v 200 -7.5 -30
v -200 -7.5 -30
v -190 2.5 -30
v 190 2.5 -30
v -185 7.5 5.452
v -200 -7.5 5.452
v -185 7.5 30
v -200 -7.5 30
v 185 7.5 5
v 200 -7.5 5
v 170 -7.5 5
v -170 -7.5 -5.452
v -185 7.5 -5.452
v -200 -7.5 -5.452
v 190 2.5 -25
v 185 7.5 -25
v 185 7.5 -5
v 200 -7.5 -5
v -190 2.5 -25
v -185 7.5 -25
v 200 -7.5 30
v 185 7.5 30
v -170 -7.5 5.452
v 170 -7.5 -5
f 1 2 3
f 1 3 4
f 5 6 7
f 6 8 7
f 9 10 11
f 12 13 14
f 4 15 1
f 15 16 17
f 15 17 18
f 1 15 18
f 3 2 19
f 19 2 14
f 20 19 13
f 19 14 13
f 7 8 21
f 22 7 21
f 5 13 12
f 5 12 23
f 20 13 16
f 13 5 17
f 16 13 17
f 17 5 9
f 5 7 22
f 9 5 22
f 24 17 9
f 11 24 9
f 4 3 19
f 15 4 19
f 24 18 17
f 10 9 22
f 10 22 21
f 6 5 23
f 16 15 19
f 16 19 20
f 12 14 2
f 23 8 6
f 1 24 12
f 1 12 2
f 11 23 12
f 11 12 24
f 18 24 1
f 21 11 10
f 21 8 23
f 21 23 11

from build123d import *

# Parameters (mm, degrees)
F0_W     = 400
F0_H     = 60
F1_DEPTH = 7.5
F3_DEPTH = 60
F4_W     = 21.213203
F4_H     = 10
F5_DEPTH = 25
F6_W     = 21.213203
F6_H     = 10.904174
F7_DEPTH = 25
F8_W     = 5
F8_H     = 5
F9_DEPTH = 200


with BuildPart() as f1:
    # F0 (on Front) → F1 (new body, symmetric)
    with BuildSketch(Plane.XZ):
        Rectangle(F0_W, F0_H)
    extrude(amount=F1_DEPTH, both=True)

    # F2 (on face) → F3 (cut)
    with BuildSketch(Plane.XY.offset(30)):
        Polygon((-200, 7.5), (-200, -7.5), (-185, 7.5), align=None)
        Polygon((185, 7.5), (200, -7.5), (200, 7.5), align=None)
    extrude(amount=-F3_DEPTH, mode=Mode.SUBTRACT)

    # F4 (on face) → F5 (cut)
    with BuildSketch(Plane(origin=(96.25, 96.25, 0), x_dir=(-0.707107, 0.707107, 0), z_dir=(0.707107, 0.707107, 0))):
        with Locations((-136.118055, 0)):
            Rectangle(F4_W, F4_H)
    extrude(amount=-F5_DEPTH, mode=Mode.SUBTRACT)

    # F6 (on face) → F7 (cut)
    with BuildSketch(Plane(origin=(-96.25, 96.25, 0), x_dir=(-0.707107, -0.707107, 0), z_dir=(-0.707107, 0.707107, 0))):
        with Locations((136.118055, 0)):
            Rectangle(F6_W, F6_H)
    extrude(amount=-F7_DEPTH, mode=Mode.SUBTRACT)

    # F8 (on Right) → F9 (cut, symmetric)
    with BuildSketch(Plane.YZ):
        with Locations((5, -27.5)):
            Rectangle(F8_W, F8_H)
    extrude(amount=F9_DEPTH, both=True, mode=Mode.SUBTRACT)


solid = f1.part
